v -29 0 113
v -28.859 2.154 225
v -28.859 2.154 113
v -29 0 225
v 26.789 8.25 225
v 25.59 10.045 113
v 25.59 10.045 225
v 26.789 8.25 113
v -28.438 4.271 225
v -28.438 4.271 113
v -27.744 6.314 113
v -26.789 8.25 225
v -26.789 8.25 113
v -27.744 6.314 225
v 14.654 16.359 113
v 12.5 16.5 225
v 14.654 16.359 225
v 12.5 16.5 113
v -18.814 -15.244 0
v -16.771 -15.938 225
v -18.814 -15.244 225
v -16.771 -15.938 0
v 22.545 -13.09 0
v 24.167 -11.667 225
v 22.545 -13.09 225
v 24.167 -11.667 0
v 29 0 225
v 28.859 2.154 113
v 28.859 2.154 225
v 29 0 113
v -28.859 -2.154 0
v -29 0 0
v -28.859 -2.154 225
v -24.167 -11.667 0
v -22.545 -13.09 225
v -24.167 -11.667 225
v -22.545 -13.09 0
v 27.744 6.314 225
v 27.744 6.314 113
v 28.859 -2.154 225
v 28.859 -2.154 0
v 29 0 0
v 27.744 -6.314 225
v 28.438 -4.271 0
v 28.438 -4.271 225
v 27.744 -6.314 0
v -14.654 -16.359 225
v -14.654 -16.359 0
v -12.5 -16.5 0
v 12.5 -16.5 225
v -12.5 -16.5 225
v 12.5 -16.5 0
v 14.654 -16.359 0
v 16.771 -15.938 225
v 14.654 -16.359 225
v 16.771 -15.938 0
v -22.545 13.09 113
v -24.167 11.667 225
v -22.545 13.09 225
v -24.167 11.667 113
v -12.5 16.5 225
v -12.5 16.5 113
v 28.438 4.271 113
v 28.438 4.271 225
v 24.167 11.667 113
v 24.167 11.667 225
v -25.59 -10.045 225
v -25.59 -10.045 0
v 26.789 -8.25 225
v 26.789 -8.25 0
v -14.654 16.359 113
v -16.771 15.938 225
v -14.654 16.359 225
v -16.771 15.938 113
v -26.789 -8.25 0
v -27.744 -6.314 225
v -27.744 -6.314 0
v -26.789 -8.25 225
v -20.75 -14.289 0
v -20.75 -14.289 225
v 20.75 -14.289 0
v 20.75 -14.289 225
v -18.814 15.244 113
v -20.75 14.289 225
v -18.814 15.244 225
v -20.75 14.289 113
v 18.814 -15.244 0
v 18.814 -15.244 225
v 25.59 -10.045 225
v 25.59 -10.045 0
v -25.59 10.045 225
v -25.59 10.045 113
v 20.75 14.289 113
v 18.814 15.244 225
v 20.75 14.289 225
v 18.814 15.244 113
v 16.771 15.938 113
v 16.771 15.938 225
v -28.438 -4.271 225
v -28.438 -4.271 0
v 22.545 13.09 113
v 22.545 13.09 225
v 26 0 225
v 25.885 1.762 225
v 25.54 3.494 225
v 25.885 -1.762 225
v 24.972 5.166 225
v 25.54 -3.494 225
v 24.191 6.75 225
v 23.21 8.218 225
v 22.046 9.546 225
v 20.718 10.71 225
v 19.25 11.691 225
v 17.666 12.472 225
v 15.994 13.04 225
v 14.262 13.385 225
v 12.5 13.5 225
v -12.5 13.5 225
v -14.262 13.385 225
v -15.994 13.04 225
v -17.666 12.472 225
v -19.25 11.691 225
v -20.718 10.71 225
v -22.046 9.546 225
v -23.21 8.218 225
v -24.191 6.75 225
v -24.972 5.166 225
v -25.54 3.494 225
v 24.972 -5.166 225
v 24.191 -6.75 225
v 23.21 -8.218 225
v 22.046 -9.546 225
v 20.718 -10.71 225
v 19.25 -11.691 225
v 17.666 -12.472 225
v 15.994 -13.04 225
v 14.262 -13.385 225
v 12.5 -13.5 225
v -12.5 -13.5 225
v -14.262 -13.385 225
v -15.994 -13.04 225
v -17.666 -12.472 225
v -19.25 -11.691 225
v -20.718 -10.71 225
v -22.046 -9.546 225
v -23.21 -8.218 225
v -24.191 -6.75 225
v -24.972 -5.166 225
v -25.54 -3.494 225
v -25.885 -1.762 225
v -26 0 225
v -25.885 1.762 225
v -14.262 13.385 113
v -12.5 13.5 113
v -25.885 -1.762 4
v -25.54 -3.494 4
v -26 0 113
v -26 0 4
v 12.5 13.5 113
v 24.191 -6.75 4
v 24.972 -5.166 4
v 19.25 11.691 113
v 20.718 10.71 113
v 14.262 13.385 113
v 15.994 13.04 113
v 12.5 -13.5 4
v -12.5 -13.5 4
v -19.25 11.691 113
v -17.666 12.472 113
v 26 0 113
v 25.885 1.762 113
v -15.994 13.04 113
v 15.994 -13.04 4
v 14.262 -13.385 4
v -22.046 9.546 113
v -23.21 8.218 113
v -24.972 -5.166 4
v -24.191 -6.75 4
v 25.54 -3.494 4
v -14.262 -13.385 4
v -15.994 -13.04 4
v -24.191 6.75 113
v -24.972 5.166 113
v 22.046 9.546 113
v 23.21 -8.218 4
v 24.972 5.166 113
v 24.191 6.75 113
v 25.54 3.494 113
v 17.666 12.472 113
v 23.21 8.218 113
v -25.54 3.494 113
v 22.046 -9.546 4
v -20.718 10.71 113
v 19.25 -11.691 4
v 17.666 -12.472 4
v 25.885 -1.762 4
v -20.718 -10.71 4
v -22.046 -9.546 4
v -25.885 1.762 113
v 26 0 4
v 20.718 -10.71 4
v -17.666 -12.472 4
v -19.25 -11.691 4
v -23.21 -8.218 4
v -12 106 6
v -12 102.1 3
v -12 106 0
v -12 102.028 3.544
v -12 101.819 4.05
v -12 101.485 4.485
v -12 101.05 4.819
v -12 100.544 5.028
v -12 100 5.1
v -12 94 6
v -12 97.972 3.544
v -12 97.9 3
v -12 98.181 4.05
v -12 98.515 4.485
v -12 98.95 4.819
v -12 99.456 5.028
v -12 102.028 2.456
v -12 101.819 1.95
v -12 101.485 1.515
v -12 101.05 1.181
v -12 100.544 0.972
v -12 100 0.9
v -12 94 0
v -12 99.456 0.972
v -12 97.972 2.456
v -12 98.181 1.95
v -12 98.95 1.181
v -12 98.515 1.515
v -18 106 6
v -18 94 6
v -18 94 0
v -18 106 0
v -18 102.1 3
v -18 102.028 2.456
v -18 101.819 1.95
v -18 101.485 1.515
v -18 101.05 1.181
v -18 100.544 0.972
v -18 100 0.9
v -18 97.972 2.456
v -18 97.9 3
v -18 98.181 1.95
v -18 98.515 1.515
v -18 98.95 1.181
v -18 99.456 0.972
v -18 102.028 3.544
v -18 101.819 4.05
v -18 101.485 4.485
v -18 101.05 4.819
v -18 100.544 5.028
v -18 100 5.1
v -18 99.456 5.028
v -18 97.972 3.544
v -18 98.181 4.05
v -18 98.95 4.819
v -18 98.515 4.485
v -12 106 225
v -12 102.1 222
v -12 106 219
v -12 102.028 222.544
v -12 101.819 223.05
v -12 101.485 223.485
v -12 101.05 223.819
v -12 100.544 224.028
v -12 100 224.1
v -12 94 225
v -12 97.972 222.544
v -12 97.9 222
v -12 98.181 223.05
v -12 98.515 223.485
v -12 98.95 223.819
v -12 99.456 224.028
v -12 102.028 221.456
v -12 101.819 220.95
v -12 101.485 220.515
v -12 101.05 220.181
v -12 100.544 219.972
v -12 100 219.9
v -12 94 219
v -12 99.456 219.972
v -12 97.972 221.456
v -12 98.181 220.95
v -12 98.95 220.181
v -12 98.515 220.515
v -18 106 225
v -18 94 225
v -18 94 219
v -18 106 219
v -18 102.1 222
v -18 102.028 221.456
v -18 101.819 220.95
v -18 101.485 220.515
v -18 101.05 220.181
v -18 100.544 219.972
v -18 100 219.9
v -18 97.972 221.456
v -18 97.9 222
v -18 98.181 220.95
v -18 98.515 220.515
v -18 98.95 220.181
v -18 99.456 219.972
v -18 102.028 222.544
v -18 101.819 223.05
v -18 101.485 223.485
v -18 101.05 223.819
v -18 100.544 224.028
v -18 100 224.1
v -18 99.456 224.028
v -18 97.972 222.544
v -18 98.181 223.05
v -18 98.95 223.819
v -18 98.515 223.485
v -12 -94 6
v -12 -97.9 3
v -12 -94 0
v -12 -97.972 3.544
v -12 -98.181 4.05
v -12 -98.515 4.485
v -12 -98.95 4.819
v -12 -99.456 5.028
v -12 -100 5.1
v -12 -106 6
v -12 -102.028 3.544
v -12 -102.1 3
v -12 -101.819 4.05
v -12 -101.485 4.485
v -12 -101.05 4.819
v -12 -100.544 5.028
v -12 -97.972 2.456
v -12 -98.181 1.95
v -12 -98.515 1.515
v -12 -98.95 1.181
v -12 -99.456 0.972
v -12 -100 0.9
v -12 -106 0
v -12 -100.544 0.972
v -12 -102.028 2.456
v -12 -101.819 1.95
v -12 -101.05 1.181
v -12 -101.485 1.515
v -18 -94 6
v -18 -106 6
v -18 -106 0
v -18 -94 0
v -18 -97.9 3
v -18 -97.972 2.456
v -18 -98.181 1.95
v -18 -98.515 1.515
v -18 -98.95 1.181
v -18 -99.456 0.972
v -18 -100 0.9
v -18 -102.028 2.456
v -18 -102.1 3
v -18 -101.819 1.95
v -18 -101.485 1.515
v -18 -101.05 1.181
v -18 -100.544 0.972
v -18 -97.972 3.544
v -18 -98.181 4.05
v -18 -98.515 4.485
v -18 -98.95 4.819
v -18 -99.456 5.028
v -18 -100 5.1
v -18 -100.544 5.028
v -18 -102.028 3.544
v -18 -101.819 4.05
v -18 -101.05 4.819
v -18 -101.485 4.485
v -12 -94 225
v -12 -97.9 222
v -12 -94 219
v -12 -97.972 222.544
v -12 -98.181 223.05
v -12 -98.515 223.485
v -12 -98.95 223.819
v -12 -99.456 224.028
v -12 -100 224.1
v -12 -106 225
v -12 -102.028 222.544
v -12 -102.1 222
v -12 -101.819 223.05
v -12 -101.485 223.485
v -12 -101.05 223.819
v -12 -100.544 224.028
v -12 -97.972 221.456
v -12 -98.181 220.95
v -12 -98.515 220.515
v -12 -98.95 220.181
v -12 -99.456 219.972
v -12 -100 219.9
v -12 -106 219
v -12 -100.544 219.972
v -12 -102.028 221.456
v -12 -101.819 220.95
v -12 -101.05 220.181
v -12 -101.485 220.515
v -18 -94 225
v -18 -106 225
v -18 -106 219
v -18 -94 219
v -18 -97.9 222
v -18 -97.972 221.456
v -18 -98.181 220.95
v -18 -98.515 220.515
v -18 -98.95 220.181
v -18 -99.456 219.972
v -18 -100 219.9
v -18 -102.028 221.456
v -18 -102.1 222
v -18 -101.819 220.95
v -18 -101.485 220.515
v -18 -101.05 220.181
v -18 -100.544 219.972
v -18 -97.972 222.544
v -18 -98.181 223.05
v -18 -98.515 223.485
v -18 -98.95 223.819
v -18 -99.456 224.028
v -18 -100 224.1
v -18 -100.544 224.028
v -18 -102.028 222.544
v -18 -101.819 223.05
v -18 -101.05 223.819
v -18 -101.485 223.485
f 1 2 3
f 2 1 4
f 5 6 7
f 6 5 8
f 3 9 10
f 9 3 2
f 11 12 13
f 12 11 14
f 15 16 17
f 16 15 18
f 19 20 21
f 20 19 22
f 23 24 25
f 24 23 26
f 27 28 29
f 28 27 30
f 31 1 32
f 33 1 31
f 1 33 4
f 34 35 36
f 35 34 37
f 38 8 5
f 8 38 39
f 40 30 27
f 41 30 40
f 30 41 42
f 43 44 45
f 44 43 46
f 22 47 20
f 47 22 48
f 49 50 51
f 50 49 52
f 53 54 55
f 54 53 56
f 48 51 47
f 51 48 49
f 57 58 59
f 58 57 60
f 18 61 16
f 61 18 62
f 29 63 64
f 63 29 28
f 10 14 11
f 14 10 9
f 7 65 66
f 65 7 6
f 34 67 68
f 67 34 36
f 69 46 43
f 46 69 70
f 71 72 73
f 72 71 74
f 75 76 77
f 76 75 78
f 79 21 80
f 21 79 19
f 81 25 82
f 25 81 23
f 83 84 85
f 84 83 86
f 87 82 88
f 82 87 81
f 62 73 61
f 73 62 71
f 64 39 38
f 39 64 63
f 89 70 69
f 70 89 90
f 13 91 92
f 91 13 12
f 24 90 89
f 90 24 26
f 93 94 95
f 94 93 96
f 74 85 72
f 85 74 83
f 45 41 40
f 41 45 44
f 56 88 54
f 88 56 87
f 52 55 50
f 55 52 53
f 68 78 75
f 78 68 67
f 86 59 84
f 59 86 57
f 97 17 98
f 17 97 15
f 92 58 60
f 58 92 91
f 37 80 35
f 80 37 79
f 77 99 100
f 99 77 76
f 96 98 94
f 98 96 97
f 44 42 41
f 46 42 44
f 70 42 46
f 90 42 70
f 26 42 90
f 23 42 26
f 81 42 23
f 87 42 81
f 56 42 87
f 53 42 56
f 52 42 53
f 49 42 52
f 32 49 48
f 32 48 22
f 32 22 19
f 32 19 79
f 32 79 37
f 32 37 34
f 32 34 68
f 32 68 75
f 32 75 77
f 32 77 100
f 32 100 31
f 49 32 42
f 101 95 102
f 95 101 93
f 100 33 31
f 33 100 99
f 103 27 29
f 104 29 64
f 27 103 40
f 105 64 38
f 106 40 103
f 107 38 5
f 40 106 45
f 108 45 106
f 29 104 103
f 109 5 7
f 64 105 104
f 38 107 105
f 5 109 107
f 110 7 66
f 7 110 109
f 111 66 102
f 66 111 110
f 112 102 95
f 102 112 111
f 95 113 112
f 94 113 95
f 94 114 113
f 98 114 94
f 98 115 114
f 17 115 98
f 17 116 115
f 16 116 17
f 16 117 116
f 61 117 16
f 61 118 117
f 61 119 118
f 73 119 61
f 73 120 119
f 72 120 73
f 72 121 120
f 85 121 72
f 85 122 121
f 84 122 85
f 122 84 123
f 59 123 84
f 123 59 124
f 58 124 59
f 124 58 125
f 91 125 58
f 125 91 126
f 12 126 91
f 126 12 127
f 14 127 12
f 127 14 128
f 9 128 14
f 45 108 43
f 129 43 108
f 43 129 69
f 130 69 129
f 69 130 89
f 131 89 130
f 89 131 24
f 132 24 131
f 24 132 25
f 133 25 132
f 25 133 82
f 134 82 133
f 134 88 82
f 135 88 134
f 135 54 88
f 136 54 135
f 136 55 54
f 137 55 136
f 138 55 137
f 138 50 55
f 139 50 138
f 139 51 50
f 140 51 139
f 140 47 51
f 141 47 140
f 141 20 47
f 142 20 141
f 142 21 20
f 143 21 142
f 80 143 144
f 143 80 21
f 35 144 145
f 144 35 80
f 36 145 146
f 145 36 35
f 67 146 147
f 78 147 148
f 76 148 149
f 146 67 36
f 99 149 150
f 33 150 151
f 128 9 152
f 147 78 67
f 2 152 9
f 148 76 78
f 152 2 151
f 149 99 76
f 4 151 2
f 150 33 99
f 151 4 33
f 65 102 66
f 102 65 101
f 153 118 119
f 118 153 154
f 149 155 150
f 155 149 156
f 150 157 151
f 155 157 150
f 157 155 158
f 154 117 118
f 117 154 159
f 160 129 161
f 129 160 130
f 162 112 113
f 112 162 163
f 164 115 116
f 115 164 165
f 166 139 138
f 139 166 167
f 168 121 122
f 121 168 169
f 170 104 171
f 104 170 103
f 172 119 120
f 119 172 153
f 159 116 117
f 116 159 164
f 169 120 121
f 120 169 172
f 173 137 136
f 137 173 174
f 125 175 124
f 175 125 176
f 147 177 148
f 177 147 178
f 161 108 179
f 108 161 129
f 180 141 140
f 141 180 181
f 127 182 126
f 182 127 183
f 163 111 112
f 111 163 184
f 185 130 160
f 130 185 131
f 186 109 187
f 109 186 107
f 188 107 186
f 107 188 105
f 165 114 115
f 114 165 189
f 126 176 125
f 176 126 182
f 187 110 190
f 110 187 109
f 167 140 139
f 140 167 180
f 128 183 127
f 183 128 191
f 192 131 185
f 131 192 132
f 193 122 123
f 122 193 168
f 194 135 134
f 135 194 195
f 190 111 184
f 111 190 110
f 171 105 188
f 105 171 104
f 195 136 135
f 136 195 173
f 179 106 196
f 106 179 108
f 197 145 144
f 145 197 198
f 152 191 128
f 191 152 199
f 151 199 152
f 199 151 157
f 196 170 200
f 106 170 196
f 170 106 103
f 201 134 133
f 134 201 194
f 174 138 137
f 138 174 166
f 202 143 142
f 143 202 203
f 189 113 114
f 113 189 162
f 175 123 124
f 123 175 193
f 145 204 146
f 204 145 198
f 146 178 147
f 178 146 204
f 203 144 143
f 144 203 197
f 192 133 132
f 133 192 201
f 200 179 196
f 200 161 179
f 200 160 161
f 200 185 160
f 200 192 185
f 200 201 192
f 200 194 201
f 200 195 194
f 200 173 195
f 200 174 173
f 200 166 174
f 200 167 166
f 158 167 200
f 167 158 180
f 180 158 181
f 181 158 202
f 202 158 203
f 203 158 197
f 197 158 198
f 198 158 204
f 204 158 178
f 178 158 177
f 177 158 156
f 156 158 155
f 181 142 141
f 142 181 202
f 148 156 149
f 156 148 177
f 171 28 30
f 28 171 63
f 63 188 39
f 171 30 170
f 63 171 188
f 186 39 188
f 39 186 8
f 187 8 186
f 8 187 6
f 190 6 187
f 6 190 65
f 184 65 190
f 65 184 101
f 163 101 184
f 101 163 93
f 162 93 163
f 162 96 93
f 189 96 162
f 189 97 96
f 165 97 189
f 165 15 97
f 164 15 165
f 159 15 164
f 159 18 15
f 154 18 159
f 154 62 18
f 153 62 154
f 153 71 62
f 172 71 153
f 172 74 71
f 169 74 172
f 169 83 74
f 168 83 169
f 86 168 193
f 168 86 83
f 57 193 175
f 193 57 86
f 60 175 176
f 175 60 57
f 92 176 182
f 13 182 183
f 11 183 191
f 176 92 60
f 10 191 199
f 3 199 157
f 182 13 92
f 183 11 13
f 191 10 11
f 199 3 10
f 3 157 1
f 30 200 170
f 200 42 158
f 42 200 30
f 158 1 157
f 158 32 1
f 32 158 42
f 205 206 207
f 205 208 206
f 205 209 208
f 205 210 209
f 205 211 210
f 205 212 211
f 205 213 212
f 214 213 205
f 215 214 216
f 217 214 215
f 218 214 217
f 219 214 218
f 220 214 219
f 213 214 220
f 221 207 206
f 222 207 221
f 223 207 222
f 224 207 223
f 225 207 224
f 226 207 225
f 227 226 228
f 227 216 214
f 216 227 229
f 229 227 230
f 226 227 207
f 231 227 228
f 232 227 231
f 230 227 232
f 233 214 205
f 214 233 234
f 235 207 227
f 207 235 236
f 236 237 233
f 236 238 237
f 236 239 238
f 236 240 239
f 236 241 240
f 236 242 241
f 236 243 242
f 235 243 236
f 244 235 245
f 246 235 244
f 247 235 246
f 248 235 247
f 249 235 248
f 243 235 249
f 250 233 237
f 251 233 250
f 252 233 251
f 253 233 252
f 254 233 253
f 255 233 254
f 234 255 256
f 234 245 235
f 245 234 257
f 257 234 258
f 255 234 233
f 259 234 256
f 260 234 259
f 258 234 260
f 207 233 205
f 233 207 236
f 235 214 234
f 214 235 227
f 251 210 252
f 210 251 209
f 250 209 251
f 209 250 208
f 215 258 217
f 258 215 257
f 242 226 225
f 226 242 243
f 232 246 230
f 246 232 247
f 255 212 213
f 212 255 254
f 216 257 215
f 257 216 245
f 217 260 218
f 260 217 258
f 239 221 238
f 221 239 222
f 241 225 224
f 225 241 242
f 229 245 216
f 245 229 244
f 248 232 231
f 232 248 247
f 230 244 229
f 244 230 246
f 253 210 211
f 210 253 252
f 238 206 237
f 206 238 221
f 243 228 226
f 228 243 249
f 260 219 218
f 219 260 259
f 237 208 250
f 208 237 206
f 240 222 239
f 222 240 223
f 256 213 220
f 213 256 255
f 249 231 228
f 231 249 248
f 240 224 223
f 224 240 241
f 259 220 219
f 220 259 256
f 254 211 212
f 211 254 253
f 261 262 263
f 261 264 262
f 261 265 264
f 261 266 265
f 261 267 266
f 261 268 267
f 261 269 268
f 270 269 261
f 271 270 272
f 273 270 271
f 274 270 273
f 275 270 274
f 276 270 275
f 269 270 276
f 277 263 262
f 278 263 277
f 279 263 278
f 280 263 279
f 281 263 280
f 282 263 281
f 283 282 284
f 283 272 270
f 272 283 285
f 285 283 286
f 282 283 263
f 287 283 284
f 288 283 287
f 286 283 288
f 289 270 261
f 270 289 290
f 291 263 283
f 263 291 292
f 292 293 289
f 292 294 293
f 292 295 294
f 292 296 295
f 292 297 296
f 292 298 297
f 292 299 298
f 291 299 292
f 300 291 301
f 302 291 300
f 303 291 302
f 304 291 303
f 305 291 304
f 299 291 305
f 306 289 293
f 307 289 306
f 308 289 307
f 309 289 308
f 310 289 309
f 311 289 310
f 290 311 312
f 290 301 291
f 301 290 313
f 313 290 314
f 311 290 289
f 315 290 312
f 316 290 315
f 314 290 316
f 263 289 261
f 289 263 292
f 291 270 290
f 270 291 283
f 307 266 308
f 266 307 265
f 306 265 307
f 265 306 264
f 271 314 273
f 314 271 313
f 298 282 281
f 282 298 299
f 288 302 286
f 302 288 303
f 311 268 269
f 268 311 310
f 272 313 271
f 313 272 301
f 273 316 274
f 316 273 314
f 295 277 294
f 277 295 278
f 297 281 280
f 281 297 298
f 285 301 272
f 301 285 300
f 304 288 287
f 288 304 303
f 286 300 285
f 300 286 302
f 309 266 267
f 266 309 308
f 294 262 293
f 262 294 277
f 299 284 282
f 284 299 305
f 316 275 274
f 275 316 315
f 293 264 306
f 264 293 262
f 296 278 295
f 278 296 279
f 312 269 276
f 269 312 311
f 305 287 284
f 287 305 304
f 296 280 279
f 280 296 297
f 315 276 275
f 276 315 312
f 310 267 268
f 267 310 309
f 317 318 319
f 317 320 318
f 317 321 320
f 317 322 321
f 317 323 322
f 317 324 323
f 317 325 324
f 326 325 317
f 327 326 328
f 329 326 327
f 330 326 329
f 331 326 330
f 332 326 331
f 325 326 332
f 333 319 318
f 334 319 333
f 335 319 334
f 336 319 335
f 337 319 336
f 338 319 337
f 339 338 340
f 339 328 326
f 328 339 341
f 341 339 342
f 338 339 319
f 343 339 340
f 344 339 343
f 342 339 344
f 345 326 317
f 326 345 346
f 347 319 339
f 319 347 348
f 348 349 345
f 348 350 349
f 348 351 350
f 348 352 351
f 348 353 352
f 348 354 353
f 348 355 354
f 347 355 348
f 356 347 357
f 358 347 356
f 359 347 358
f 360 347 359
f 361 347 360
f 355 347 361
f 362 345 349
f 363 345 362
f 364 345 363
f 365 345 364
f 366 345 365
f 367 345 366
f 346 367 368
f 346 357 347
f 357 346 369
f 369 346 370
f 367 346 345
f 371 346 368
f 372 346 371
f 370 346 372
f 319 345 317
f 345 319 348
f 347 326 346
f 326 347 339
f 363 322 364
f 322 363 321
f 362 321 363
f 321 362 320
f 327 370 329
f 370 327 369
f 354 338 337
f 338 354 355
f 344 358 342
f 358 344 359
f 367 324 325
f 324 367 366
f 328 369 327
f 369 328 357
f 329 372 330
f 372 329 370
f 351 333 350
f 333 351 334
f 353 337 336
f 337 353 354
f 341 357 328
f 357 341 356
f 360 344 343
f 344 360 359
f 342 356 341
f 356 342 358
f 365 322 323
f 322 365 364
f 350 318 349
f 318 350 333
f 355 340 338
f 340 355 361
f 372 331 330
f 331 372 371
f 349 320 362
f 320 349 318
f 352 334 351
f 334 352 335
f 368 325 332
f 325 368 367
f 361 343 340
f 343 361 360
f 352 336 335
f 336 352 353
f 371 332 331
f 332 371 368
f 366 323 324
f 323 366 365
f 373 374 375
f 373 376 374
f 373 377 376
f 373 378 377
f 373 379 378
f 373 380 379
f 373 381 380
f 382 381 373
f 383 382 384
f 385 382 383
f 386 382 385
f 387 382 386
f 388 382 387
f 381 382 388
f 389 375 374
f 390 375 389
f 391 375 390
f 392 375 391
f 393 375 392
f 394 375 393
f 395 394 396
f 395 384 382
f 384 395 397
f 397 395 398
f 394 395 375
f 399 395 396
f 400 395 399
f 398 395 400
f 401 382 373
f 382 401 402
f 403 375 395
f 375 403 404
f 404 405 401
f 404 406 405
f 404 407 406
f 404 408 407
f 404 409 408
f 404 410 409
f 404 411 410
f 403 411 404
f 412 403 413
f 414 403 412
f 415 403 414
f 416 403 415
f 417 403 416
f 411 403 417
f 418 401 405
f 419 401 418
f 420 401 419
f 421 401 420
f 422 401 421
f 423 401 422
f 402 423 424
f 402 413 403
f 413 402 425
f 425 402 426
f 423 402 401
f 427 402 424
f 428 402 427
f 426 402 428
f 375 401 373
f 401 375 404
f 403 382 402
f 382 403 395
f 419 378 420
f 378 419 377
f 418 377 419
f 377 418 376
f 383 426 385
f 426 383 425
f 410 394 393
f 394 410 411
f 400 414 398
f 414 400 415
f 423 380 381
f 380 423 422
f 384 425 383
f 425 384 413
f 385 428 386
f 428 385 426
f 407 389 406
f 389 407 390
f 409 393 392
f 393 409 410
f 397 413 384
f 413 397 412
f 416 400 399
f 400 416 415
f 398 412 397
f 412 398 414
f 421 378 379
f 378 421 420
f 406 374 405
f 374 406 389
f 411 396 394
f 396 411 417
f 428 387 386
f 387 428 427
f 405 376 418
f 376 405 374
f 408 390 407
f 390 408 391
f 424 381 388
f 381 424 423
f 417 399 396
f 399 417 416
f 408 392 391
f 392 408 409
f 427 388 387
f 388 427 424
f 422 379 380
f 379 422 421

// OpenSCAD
// ============================================================
// Berceau batterie — robot pendule inversé
// Batterie Ni-MH 12V : section ovale 50×25mm, longueur 215mm
// Cables sortent côté +Y (vers centre du robot)
// Fixation : 4 tiges M4, entraxe latéral 200mm
// ============================================================

// --- Paramètres batterie ---
BAT_W  = 50;    // largeur (grand axe ovale), mm
BAT_H  = 25;    // hauteur (petit axe ovale), mm
BAT_L  = 215;   // longueur, mm
JEU    = 1.0;   // jeu radial de chaque côté

// --- Paramètres berceau ---
WALL   = 3.0;   // épaisseur paroi
FOND   = 4.0;   // épaisseur fond
HAUTEUR_PAROI = BAT_H / 2 + WALL;  // demi-hauteur + paroi
REBORD = 5.0;   // hauteur du rebord latéral au-dessus de l'axe neutre

// --- Tiges M4 ---
ROD_D        = 4.2;   // diamètre perçage (M4 + jeu)
ENTRAXE_LAT  = 200;   // entraxe gauche-droite (= entraxe roues)
ENTRAXE_LON  = 60;    // entraxe avant-arrière (à ajuster selon châssis)
LATTE_W      = 12;    // largeur des pattes de fixation
LATTE_H      = 6;     // épaisseur des pattes

// --- Encoche câbles ---
CABLE_W = 12;   // largeur de l'encoche câbles
CABLE_H = 10;   // hauteur de l'encoche câbles

// ============================================================
// Profil ovale (section transversale de la batterie)
// ============================================================
module oval_2d(w, h) {
    // hull de deux cercles de diamètre h, espacés de (w-h) sur X
    hull() {
        translate([-(w - h) / 2, 0]) circle(d = h, $fn = 48);
        translate([ (w - h) / 2, 0]) circle(d = h, $fn = 48);
    }
}

// ============================================================
// Corps principal du berceau (demi-coquille + rebords)
// ============================================================
module corps_berceau() {
    iw = BAT_W + 2 * JEU;   // section intérieure largeur
    ih = BAT_H + 2 * JEU;   // section intérieure hauteur
    ow = iw + 2 * WALL;      // section extérieure largeur
    oh = ih + 2 * WALL;      // section extérieure hauteur
    L  = BAT_L + 4;          // longueur intérieure (2mm jeu chaque bout)
    Lo = L + 2 * WALL;       // longueur extérieure

    difference() {
        // Corps extérieur — extrusion du profil ovale sur la longueur
        translate([0, 0, 0])
        linear_extrude(height = Lo)
            oval_2d(ow, oh);

        // Évidement intérieur batterie (s'arrête à FOND du fond)
        translate([0, 0, FOND])
        linear_extrude(height = Lo)  // on coupe ensuite par le demi-espace
            oval_2d(iw, ih);

        // Couper la moitié supérieure (on garde la coquille inférieure)
        // Z est l'axe longueur, Y est le grand axe, X est l'axe vertical
        // → on veut garder X < 0 (bas du robot)
        translate([0, oh, 0])
        cube([ow * 2, oh * 2, Lo + 1], center = true);

        // Encoche câbles : côté +Y (vers centre robot), centré en longueur
        translate([-CABLE_H / 2, iw / 2 - 1, Lo / 2 - CABLE_W / 2])
        cube([CABLE_H + WALL, WALL + 2, CABLE_W]);
    }
}

// ============================================================
// Pattes de fixation M4 (4 coins)
// Soudées sur les faces extrémités du berceau
// ============================================================
module patte(side_y) {
    // side_y = +1 (droit) ou -1 (gauche)
    ow = BAT_W + 2 * JEU + 2 * WALL;
    Lo = BAT_L + 4 + 2 * WALL;

    // Position X de la tige : centrée sur la paroi basse du berceau
    tx = -(BAT_H / 2 + JEU + WALL / 2);
    ty = side_y * (ENTRAXE_LAT / 2);

    // Avant (Z=0) et arrière (Z=Lo)
    for (tz = [WALL, Lo - WALL]) {
        translate([tx, ty, tz])
        difference() {
            // Bloc de la patte
            cube([LATTE_H, LATTE_W, LATTE_H], center = true);
            // Perçage M4
            rotate([0, 90, 0])
            cylinder(d = ROD_D, h = LATTE_H + 1, center = true, $fn = 24);
        }
    }
}

// ============================================================
// Assemblage final
// ============================================================
module berceau_batterie() {
    corps_berceau();
    patte(+1);
    patte(-1);
}

berceau_batterie();
